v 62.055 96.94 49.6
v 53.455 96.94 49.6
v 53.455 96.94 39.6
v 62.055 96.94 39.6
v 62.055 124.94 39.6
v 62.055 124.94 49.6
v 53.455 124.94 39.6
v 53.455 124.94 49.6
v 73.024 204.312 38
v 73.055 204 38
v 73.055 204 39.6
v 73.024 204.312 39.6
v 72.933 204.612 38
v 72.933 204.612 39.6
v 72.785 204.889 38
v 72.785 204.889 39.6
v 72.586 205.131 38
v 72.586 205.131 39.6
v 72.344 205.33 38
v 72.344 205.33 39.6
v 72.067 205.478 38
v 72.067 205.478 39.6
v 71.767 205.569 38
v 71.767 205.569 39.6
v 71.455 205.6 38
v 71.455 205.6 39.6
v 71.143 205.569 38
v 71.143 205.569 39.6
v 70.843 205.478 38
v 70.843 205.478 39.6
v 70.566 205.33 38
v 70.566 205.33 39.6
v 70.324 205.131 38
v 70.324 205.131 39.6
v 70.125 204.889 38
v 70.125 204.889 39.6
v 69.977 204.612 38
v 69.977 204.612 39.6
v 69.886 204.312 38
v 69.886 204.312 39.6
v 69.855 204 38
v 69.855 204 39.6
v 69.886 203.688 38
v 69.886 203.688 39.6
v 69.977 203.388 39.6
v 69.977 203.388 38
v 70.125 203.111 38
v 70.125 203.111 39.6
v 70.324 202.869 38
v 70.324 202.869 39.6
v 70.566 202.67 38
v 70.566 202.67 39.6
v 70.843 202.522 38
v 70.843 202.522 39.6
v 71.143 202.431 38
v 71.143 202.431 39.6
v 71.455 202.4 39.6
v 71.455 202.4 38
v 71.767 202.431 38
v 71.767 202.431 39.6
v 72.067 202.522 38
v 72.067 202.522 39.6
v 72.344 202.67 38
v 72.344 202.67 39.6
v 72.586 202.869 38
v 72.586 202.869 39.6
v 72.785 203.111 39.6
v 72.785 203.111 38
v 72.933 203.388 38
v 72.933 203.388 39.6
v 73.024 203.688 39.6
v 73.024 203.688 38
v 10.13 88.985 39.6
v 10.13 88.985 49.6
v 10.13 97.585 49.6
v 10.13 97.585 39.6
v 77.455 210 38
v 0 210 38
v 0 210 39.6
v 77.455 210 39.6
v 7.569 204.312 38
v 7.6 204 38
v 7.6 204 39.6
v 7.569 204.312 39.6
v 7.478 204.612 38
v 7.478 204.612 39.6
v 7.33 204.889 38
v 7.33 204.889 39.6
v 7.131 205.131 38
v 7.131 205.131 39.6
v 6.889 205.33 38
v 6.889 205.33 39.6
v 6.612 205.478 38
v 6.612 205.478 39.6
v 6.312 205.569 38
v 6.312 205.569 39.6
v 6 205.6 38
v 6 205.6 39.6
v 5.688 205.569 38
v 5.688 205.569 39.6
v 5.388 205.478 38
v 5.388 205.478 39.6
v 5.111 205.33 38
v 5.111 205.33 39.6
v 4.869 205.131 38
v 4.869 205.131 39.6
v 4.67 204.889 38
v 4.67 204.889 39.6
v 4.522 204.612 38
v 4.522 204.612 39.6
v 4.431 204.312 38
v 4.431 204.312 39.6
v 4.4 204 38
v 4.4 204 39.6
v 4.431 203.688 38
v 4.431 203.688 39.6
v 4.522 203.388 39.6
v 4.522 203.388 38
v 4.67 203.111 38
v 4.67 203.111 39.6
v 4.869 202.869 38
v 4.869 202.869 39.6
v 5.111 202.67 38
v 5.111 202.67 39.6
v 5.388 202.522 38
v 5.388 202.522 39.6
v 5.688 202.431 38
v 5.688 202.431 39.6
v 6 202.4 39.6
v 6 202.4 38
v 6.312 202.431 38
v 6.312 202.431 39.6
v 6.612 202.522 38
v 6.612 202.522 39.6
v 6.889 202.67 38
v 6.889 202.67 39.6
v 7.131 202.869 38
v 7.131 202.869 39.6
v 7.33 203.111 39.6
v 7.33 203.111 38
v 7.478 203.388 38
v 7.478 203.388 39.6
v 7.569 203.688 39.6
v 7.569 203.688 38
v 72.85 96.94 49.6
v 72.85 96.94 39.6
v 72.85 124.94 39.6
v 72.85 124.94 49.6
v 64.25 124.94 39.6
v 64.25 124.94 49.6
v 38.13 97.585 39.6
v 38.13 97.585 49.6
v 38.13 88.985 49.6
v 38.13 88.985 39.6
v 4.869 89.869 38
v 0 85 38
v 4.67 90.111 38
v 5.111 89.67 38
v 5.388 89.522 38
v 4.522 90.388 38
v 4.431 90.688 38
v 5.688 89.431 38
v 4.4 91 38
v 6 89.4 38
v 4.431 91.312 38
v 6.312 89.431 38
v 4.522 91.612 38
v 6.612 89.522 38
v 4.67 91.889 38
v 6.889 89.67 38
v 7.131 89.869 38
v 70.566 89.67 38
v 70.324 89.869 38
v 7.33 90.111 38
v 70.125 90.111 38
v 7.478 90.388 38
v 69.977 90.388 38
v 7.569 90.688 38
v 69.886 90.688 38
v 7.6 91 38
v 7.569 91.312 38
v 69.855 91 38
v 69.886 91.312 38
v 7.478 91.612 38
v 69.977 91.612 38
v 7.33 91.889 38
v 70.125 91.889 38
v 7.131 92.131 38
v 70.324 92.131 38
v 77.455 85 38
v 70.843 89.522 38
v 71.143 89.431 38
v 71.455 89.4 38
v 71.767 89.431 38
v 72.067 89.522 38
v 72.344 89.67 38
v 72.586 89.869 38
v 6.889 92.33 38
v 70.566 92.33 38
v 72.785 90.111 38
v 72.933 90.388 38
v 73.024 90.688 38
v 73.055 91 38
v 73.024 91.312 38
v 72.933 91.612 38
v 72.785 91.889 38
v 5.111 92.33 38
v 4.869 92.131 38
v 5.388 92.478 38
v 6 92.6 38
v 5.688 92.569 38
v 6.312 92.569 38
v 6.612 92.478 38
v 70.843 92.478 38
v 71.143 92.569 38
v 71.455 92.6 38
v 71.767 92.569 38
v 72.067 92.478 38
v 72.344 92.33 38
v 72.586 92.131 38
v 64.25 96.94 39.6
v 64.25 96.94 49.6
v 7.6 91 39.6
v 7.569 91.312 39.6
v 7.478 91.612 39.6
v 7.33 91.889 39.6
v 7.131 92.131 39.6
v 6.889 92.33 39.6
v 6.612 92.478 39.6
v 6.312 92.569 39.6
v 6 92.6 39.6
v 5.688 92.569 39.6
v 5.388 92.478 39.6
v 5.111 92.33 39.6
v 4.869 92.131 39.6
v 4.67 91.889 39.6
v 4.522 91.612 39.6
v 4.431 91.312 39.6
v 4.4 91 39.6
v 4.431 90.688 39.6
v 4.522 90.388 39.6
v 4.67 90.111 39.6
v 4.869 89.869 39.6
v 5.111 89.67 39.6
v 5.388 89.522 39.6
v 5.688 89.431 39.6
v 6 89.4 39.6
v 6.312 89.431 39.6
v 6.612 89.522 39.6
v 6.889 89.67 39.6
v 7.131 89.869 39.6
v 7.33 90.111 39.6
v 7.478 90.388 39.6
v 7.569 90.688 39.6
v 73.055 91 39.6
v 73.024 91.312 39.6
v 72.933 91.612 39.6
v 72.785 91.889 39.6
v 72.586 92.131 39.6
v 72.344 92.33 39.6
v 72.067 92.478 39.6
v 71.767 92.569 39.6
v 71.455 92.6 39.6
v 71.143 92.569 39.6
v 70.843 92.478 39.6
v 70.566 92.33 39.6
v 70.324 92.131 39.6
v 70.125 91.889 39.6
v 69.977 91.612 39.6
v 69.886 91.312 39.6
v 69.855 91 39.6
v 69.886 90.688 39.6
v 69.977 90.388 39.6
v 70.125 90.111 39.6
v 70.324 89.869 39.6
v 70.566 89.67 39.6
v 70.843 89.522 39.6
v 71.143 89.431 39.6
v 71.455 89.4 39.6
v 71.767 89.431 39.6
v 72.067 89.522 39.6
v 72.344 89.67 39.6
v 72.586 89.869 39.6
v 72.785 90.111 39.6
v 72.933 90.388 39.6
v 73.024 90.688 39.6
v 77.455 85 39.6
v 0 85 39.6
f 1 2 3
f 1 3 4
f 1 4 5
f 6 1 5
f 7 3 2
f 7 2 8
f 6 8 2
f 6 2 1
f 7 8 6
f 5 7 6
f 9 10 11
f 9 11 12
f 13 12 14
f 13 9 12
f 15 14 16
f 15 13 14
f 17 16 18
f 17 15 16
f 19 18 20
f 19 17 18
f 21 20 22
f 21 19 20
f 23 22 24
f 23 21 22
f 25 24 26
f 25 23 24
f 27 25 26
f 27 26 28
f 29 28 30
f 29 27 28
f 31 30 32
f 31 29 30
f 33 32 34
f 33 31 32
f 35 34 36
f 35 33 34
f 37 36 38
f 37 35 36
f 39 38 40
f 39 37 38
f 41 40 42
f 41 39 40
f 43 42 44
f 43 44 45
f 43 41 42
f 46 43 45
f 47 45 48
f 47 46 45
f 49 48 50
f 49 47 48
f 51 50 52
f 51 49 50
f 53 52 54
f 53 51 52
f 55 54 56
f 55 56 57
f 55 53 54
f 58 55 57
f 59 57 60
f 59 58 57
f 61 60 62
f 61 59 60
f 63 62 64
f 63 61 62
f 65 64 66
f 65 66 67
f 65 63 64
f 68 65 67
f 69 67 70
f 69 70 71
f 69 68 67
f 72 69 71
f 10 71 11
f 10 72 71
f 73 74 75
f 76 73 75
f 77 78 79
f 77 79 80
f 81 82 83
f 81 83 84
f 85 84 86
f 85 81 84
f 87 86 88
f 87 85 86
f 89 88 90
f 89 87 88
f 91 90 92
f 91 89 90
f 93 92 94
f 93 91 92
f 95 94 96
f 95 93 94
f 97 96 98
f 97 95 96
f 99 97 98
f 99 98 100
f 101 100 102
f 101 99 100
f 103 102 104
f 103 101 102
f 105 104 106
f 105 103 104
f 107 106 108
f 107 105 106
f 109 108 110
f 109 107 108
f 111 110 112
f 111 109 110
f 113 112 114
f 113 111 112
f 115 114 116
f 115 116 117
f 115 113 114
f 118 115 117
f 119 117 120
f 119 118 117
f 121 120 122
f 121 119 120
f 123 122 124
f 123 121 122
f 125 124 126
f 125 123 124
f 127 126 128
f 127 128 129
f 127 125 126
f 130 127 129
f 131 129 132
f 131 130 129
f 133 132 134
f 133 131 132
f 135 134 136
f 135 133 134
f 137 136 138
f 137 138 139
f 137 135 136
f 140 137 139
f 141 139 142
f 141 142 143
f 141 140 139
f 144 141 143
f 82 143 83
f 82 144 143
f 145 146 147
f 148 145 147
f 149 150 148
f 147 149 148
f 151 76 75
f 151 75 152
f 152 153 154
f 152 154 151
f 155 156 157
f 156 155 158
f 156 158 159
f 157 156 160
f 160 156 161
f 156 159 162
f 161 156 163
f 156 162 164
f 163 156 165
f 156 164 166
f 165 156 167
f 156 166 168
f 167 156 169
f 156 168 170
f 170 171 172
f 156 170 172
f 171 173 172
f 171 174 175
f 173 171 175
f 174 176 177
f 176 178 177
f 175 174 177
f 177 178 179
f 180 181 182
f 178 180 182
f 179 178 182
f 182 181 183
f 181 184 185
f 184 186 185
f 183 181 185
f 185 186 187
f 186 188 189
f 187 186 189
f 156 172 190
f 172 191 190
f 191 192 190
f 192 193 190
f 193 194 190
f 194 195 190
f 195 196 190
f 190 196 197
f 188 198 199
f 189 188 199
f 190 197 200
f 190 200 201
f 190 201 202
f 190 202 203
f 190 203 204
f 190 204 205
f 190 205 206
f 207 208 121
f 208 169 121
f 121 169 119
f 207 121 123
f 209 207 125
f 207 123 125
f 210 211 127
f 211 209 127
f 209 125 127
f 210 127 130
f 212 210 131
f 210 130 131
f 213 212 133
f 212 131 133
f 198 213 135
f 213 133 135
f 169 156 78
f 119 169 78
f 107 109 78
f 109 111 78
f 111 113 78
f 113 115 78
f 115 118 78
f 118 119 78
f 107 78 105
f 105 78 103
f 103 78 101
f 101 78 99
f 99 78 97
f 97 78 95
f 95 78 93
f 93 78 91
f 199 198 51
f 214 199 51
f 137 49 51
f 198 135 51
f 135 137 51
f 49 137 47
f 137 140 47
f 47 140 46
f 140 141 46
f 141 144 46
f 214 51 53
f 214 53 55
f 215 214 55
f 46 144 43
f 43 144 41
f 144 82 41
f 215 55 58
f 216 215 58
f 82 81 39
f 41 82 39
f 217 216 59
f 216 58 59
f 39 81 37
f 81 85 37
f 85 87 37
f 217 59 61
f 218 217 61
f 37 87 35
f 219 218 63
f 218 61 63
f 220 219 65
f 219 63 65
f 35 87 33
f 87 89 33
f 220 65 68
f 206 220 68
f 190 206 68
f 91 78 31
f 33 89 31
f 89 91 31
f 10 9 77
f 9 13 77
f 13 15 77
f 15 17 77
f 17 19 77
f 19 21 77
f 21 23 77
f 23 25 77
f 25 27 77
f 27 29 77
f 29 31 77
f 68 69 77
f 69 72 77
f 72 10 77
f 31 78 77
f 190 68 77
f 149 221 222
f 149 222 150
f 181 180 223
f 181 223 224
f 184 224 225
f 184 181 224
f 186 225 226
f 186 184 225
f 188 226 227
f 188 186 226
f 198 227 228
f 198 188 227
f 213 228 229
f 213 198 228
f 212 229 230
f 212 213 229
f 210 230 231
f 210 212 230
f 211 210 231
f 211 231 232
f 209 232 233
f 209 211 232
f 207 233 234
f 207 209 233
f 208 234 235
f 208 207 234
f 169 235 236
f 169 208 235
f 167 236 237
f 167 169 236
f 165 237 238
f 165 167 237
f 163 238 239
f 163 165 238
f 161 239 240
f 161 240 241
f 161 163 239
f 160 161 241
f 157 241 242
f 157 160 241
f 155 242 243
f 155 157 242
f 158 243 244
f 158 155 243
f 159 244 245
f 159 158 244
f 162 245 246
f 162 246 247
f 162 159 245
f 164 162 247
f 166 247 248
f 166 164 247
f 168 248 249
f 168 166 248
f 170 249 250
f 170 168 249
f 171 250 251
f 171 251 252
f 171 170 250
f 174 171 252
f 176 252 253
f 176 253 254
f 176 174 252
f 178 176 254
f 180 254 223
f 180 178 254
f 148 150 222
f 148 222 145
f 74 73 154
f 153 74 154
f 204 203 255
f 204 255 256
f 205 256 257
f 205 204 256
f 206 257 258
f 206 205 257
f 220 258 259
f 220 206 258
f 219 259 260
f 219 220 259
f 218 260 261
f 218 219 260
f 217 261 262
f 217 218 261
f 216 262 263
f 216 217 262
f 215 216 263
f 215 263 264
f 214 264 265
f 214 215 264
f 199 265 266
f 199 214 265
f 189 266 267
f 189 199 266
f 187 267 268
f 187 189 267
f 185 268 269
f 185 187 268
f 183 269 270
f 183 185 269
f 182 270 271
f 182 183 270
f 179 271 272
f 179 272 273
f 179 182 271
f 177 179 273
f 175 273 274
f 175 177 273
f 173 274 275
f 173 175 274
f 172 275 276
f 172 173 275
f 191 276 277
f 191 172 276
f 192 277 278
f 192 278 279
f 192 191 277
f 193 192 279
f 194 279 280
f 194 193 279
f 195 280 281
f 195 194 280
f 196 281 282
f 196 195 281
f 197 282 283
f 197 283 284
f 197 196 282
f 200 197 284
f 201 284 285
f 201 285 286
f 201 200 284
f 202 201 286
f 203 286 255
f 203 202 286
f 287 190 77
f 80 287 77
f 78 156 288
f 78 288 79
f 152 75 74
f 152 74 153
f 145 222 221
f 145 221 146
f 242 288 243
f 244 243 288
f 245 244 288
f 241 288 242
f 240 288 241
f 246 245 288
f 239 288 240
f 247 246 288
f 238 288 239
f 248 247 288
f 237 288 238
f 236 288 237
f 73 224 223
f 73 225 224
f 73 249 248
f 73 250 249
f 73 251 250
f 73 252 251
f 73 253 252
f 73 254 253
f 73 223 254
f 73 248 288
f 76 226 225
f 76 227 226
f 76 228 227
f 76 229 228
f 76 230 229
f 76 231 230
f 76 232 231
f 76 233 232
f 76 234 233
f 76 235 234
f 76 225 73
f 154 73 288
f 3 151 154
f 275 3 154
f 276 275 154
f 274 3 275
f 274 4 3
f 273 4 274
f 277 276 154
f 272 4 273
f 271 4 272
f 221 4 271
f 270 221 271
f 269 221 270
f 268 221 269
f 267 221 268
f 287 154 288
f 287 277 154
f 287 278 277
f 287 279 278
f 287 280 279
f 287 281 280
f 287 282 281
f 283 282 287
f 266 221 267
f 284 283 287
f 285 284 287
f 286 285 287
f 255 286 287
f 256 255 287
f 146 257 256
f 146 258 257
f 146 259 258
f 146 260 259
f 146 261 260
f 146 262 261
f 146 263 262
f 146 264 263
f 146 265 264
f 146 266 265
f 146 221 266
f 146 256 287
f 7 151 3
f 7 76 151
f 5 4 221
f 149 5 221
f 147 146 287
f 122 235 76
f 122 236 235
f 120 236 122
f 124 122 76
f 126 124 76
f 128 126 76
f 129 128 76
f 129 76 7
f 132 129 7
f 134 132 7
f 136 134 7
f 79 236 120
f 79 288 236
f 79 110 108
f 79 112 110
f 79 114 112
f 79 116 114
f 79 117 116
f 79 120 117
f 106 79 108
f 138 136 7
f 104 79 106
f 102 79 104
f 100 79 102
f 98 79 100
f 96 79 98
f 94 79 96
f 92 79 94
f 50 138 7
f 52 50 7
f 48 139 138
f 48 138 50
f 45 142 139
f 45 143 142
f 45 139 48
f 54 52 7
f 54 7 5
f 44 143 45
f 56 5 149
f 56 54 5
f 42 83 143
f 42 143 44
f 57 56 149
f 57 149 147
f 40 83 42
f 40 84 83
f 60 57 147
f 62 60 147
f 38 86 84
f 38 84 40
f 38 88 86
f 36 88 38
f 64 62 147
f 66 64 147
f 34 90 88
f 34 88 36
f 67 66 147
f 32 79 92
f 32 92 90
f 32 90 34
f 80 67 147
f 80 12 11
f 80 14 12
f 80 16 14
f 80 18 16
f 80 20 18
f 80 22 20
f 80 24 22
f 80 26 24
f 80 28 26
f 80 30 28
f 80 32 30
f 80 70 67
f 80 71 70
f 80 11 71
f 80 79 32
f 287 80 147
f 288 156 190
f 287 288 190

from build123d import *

# Parameters (mm, degrees)
SKETCH009_W      = 28
SKETCH009_H      = 8.6
SKETCH009_W_2    = 8.6
SKETCH009_H_2    = 28
EXTRUDE009_DEPTH = 10
SKETCH008_W      = 77.455
SKETCH008_H      = 125
SKETCH008_R      = 1.6
EXTRUDE008_DEPTH = 1.6


with BuildPart() as extrude009:
    # Sketch009 (on Face10 of Extrude008) → Extrude009 (new body)
    with BuildSketch(Plane.XY.offset(39.6)):
        with Locations((24.13, 93.285)):
            Rectangle(SKETCH009_W, SKETCH009_H)
        with Locations((57.755, 110.94)):
            Rectangle(SKETCH009_W_2, SKETCH009_H_2)
        with Locations((68.55, 110.94)):
            Rectangle(SKETCH009_W_2, SKETCH009_H_2)
    extrude(amount=EXTRUDE009_DEPTH)


with BuildPart() as clock:
    # Sketch008 → Extrude008 (new body)
    with BuildSketch(Plane.XY.offset(38)):
        with Locations((38.7275, 147.5)):
            Rectangle(SKETCH008_W, SKETCH008_H)
        with Locations((6, 204)):
            Circle(SKETCH008_R, mode=Mode.SUBTRACT)
        with Locations((6, 91)):
            Circle(SKETCH008_R, mode=Mode.SUBTRACT)
        with Locations((71.455, 91)):
            Circle(SKETCH008_R, mode=Mode.SUBTRACT)
        with Locations((71.455, 204)):
            Circle(SKETCH008_R, mode=Mode.SUBTRACT)
    extrude(amount=EXTRUDE008_DEPTH)

    # Fusion: union Extrude009
    add(extrude009.part)


solid = clock.part
